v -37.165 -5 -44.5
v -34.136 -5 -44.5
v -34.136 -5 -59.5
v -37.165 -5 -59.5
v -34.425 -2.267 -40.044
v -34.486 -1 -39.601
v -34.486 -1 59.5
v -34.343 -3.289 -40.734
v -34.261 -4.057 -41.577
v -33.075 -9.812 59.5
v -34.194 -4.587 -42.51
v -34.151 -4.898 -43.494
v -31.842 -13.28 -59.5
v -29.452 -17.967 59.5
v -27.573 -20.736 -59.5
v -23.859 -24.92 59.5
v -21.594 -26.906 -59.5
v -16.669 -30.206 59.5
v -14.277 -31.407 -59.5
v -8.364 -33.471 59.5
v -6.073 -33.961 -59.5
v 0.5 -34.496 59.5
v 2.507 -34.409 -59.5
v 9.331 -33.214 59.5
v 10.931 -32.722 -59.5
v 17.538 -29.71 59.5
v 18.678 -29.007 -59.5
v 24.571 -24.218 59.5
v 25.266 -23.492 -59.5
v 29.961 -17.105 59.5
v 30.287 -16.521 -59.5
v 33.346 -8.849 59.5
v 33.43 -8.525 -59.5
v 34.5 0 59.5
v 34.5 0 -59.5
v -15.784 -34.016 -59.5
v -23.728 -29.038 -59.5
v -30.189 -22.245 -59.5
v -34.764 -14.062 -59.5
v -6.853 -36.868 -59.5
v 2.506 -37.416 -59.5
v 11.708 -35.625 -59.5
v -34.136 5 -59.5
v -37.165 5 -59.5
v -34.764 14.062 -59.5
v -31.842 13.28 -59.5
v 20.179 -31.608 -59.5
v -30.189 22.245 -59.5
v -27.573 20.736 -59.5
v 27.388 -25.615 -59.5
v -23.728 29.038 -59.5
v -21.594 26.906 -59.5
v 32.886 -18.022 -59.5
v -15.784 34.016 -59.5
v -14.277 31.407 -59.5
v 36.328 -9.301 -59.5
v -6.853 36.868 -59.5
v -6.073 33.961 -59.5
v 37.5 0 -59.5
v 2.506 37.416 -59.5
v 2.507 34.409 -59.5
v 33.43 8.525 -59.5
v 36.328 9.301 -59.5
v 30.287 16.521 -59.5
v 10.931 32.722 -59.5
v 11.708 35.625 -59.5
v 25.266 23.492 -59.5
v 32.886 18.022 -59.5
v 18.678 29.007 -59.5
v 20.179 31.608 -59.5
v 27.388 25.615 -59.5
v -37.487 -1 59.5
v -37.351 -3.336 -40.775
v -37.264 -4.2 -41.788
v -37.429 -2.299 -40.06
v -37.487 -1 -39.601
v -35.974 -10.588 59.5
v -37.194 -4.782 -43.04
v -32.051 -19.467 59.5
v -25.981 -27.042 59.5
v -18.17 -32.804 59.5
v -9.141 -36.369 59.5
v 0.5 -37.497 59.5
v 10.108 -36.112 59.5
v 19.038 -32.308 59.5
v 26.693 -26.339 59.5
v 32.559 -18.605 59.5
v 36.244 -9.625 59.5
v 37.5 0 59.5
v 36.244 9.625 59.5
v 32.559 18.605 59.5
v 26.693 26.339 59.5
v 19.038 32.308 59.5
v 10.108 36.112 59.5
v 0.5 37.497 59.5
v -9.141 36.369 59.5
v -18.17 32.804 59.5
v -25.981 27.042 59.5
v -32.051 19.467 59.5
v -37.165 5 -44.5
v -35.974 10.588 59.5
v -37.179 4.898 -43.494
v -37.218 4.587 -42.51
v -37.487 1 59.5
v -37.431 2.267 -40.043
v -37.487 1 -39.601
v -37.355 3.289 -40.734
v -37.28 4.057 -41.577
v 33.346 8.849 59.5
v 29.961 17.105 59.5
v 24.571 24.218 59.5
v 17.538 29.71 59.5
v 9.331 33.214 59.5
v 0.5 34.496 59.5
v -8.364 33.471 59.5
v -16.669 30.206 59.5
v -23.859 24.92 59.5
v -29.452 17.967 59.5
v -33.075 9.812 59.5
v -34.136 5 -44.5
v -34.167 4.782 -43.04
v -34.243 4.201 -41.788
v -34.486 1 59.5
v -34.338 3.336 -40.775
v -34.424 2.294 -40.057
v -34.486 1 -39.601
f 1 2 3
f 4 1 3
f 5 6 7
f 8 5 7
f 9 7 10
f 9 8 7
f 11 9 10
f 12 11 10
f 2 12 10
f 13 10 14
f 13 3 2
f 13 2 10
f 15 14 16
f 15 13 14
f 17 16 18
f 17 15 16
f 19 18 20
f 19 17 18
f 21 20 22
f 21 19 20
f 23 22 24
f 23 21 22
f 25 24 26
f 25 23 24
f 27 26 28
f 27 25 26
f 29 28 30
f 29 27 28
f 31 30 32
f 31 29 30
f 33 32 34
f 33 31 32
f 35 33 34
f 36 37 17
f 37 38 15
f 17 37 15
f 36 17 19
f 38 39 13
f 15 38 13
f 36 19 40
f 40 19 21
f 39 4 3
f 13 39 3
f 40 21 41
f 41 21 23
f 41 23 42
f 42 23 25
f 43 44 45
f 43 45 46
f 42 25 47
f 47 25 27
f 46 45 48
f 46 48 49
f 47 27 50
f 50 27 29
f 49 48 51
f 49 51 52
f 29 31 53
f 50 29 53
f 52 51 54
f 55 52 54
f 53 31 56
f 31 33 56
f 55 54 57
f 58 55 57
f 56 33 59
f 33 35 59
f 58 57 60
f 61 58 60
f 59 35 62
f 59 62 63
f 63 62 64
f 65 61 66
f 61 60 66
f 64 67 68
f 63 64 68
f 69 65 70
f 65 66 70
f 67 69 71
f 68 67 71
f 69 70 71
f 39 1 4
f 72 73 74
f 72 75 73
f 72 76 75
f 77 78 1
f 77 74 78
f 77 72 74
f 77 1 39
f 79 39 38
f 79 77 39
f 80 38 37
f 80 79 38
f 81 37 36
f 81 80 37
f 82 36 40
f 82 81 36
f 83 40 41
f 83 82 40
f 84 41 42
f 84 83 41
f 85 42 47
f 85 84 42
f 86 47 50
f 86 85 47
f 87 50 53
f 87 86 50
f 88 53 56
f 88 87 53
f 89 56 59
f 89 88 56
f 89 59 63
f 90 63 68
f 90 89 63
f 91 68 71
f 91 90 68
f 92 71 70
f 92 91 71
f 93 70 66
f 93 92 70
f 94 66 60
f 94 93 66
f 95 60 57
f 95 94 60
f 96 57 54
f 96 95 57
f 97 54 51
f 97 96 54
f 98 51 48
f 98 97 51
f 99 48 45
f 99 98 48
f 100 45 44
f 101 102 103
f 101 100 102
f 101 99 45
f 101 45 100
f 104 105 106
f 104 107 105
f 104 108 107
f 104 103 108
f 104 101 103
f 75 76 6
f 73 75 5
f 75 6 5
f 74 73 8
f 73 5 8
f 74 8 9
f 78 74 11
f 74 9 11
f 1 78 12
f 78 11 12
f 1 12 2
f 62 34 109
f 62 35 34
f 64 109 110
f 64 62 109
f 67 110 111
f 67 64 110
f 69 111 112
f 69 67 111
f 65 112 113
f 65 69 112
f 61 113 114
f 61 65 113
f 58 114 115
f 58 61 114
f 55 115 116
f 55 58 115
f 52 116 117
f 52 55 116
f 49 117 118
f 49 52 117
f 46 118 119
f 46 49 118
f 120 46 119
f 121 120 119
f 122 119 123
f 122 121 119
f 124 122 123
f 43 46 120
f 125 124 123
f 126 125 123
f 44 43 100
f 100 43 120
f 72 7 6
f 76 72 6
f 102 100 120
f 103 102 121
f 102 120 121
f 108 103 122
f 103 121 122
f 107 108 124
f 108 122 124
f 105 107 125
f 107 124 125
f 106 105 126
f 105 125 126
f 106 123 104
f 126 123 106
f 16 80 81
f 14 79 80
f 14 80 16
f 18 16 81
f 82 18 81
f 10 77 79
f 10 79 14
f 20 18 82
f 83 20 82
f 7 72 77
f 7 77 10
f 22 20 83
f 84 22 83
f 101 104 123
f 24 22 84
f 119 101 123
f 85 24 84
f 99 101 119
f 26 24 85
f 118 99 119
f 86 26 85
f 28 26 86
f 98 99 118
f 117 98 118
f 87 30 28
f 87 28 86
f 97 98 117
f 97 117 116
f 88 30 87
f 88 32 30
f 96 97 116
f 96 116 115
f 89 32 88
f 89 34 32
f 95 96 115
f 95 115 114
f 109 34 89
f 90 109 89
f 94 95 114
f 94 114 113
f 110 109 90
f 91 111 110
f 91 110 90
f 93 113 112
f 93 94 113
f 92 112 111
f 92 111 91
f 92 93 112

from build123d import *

# Parameters (mm, degrees)
SKETCH_2_R               = 37.5
SKETCH_2_R_2             = 34.5
EXTRUDE_1_DEPTH          = 59.5
CUT_EXTRUDE_1_REACH      = 81.704
CUT_EXTRUDE_1_END_RADIUS = 37.5
CUT_EXTRUDE_2_REACH      = 81.704
CUT_EXTRUDE_2_END_RADIUS = 37.5
SKETCH_4_W               = 119
SKETCH_4_H               = 2


with BuildPart() as part:
    # 草图2 → 凸台-拉伸1 (new, symmetric)
    with BuildSketch(Plane.XY):
        Circle(SKETCH_2_R)
        Circle(SKETCH_2_R_2, mode=Mode.SUBTRACT)
    extrude(amount=EXTRUDE_1_DEPTH, both=True)

    # 切除-拉伸1: up to this cylinder (the profile starts inside it)
    cut_extrude_1_end = Plane(origin=(0, 0, -50.003604), z_dir=(0, 0, -1)) * Cylinder(CUT_EXTRUDE_1_END_RADIUS, 239.408, mode=Mode.PRIVATE)
    # 草图3 → 切除-拉伸1 (cut, up to the surface)
    with BuildSketch(Plane(origin=(0, 0, 0), x_dir=(0, 0, -1), z_dir=(1, 0, 0)), mode=Mode.PRIVATE) as cut_extrude_1_sk1:
        with BuildLine():
            Line((44.5, -5), (59.5, -5))
            Line((59.5, -5), (59.5, 5))
            Line((59.5, 5), (44.5, 5))
            ThreePointArc((44.5, 5), (39.5, 0), (44.5, -5))
        make_face()
    cut_extrude_1_tool1 = extrude(cut_extrude_1_sk1.sketch, amount=-CUT_EXTRUDE_1_REACH, mode=Mode.PRIVATE) & cut_extrude_1_end
    add(cut_extrude_1_tool1.solids().sort_by_distance((0, 0, -50.003604))[0], mode=Mode.SUBTRACT)

    # 切除-拉伸2: up to this cylinder (the profile starts inside it)
    cut_extrude_2_end = Plane(origin=(0, 0, 0), z_dir=(0, 0, -1)) * Cylinder(CUT_EXTRUDE_2_END_RADIUS, 239.408, mode=Mode.PRIVATE)
    # 草图4 → 切除-拉伸2 (cut, up to the surface)
    with BuildSketch(Plane(origin=(0, 0, 0), x_dir=(0, 0, -1), z_dir=(1, 0, 0)), mode=Mode.PRIVATE) as cut_extrude_2_sk1:
        Rectangle(SKETCH_4_W, SKETCH_4_H)
    cut_extrude_2_tool1 = extrude(cut_extrude_2_sk1.sketch, amount=-CUT_EXTRUDE_2_REACH, mode=Mode.PRIVATE) & cut_extrude_2_end
    add(cut_extrude_2_tool1.solids().sort_by_distance((0, 0, 0))[0], mode=Mode.SUBTRACT)


solid = part.part
